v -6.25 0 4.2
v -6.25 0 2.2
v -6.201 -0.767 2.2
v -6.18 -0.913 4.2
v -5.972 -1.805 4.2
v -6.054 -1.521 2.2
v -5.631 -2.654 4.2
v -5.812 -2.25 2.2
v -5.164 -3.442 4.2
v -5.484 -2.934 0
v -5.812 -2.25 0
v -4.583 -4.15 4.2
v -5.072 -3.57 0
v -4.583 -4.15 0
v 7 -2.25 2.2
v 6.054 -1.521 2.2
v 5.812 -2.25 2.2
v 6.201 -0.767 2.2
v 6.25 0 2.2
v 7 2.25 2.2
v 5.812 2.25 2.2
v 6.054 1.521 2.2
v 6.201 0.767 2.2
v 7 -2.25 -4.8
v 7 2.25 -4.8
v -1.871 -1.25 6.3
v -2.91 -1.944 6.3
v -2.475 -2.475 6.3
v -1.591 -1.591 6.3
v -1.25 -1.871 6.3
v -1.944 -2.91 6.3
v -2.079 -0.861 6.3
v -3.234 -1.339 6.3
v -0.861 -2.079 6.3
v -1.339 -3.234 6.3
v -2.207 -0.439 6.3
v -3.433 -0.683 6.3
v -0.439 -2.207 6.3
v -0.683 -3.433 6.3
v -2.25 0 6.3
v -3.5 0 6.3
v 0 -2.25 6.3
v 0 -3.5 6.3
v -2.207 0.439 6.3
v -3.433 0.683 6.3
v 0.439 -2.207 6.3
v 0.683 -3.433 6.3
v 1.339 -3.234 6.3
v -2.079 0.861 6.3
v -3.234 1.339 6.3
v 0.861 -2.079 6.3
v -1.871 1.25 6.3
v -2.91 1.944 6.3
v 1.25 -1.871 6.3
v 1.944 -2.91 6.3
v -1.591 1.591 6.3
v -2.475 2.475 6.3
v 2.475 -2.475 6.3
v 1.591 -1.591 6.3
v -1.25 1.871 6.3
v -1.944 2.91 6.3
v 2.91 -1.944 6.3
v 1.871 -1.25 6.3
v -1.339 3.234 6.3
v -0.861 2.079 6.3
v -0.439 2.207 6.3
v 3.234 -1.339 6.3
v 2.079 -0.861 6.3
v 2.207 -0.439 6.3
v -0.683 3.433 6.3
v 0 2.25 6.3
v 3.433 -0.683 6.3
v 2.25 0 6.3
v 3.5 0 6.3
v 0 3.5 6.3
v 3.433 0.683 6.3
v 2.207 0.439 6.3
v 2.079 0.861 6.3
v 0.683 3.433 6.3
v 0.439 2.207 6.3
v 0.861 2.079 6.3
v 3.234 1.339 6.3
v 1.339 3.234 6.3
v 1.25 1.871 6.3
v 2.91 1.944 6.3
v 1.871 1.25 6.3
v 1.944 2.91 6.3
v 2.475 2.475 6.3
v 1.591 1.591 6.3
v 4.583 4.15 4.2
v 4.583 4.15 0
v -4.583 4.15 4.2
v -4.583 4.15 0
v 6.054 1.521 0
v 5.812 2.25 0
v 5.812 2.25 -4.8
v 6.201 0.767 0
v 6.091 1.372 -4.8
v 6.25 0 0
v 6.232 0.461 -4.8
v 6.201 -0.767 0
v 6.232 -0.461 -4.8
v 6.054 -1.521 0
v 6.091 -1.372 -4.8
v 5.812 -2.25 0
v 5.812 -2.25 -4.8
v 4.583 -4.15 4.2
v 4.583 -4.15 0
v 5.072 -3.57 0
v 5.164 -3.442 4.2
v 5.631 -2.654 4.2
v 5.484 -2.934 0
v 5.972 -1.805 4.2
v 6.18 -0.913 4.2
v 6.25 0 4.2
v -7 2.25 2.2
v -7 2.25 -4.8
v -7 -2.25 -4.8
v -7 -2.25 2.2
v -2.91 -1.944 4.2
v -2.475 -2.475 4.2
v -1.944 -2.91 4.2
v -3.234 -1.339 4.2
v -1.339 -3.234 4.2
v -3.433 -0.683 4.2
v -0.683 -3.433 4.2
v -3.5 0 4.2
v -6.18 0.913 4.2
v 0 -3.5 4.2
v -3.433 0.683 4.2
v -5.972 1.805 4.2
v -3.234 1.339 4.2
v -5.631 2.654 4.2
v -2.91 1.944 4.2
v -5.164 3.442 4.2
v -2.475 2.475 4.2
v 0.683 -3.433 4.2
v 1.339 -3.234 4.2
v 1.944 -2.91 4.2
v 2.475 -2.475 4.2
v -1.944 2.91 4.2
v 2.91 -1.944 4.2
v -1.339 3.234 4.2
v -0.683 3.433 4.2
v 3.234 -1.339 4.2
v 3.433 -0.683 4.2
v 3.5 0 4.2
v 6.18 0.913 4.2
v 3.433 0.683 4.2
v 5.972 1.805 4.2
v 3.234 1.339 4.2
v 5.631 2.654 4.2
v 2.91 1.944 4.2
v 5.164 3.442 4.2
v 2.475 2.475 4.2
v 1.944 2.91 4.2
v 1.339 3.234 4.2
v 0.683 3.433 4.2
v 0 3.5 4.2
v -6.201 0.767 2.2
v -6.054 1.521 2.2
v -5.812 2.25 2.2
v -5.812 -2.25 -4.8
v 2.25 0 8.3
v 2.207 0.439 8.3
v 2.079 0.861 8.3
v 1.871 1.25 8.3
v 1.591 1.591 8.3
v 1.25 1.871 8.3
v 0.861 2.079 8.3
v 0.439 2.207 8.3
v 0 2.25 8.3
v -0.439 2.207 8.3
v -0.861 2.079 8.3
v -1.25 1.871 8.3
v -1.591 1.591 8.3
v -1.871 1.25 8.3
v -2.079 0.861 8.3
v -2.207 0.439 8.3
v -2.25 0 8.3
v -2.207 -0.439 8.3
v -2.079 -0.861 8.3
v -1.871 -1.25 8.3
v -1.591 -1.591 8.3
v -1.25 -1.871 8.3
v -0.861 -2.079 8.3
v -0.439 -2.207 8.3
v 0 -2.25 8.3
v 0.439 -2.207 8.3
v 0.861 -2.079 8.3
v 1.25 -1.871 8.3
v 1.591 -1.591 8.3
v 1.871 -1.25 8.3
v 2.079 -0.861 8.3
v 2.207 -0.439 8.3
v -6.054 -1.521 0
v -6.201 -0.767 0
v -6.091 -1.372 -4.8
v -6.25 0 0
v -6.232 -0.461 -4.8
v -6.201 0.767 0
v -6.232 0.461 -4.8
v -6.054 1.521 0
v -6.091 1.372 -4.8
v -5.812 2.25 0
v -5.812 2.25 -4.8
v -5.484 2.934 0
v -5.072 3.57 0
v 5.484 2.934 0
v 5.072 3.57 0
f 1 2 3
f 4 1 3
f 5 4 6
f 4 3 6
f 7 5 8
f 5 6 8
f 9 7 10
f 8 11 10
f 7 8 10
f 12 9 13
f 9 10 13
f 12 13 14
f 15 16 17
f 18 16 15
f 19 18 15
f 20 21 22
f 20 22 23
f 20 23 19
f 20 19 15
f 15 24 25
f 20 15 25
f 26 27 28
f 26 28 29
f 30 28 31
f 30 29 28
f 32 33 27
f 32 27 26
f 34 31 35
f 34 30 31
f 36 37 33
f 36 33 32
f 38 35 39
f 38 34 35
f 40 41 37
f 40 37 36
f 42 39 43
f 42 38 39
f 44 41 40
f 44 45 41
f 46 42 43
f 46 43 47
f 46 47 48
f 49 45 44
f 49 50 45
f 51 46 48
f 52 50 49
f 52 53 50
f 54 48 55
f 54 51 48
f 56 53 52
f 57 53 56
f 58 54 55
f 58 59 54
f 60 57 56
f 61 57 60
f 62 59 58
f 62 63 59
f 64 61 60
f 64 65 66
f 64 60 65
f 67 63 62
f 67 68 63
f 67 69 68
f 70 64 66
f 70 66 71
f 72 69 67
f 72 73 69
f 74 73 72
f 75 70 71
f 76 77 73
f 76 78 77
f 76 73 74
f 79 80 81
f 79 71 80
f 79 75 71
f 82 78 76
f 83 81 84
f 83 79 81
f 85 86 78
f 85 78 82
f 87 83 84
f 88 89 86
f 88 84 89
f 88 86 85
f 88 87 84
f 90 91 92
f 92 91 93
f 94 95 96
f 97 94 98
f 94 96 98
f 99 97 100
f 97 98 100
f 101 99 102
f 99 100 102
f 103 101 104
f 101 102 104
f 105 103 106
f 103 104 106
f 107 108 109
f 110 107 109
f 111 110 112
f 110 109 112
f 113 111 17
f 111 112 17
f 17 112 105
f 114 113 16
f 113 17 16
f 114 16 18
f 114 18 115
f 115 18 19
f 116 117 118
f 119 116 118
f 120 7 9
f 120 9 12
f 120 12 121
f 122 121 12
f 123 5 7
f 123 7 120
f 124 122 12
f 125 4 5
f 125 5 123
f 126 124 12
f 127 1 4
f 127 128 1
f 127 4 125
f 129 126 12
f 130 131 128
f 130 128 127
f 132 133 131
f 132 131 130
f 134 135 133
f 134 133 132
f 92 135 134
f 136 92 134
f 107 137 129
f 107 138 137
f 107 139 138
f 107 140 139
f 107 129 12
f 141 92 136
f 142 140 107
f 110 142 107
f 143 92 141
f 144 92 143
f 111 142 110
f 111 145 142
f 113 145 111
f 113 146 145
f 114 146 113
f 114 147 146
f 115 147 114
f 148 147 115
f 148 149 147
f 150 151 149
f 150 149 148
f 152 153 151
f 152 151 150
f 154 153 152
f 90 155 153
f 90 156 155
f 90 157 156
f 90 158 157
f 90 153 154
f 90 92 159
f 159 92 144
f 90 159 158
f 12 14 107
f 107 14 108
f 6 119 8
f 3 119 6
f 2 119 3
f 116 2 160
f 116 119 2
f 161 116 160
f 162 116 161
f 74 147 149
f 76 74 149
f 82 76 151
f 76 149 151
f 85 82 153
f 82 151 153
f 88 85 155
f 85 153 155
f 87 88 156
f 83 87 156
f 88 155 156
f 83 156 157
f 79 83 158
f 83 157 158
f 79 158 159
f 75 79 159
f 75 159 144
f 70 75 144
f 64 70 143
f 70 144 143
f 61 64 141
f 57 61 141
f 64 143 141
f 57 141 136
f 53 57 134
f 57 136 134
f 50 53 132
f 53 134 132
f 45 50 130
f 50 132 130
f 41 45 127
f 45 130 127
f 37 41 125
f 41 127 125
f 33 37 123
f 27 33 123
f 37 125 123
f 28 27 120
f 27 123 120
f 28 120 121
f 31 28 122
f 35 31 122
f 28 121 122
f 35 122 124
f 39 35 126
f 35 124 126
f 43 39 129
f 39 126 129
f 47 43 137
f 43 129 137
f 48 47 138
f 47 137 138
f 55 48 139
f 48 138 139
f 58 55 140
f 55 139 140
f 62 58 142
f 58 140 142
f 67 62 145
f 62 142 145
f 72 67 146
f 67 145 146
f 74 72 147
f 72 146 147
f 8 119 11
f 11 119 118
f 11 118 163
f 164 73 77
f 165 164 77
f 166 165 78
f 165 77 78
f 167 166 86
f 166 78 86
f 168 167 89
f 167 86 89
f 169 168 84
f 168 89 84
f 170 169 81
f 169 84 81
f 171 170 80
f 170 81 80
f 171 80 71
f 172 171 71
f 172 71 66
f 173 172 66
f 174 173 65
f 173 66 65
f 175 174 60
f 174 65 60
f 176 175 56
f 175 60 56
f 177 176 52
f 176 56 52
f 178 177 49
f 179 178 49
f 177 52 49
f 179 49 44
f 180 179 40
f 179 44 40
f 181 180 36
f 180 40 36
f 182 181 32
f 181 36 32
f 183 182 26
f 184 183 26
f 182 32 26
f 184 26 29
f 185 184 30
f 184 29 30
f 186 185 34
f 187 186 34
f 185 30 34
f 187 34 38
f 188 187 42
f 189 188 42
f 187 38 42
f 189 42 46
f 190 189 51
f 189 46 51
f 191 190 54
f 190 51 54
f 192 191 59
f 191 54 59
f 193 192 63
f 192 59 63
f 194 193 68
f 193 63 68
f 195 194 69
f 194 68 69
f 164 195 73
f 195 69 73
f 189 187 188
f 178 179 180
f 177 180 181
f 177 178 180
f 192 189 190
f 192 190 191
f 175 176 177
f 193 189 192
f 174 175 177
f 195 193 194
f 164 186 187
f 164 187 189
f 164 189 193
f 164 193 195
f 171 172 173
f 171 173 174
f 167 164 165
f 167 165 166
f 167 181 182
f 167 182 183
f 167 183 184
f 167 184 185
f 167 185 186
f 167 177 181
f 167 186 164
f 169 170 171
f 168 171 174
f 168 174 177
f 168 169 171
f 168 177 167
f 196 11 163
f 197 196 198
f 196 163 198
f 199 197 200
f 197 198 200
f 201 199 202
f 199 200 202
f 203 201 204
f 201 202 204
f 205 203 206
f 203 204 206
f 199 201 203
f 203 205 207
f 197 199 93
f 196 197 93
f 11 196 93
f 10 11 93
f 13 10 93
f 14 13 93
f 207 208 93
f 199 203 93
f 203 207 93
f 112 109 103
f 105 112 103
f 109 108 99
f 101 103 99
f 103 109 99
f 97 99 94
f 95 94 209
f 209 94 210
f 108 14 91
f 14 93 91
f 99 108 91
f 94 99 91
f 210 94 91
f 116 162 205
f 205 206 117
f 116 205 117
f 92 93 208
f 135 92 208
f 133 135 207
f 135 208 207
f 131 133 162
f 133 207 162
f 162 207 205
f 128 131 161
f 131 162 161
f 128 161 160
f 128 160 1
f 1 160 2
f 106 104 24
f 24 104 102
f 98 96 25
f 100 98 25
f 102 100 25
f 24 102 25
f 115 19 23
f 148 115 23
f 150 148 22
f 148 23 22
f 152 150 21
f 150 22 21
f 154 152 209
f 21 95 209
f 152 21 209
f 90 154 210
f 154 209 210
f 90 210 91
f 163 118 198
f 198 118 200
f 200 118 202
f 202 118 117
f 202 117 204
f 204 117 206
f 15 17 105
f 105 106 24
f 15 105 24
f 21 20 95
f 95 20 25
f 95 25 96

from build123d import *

# Parameters (mm, degrees)
EXTRUDE_1_DEPTH = 4.2
SKETCH_2_R      = 3.5
EXTRUDE_2_DEPTH = 2.1
SKETCH_3_R      = 2.25
EXTRUDE_3_DEPTH = 2
EXTRUDE_START   = -9
EXTRUDE_4_DEPTH = 7


with BuildPart() as part:
    # 草图1 → 凸台-拉伸1 (new body)
    with BuildSketch(Plane.XY):
        with BuildLine():
            ThreePointArc((-6.25, 3.3e-08), (-5.817755734, -2.236089463), (-4.583301282, -4.15))
            Line((-4.583301282, -4.15), (4.583301282, -4.15))
            ThreePointArc((4.583301282, -4.15), (5.817755724, -2.236089488), (6.25, -2.1e-08))
            ThreePointArc((6.25, -2.1e-08), (5.817755732, 2.236089469), (4.583301282, 4.15))
            Line((4.583301282, 4.15), (-4.583301282, 4.15))
            ThreePointArc((-4.583301282, 4.15), (-5.817755722, 2.236089494), (-6.25, 3.3e-08))
        make_face()
    extrude(amount=EXTRUDE_1_DEPTH)

    # 草图2 → 凸台-拉伸2 (add)
    with BuildSketch(Plane.XY.offset(4.2)):
        Circle(SKETCH_2_R)
    extrude(amount=EXTRUDE_2_DEPTH)

    # 草图3 → 凸台-拉伸3 (add)
    with BuildSketch(Plane.XY.offset(6.3)):
        Circle(SKETCH_3_R)
    extrude(amount=EXTRUDE_3_DEPTH)

    # 草图4 → 凸台-拉伸4 (add)
    with BuildSketch(Plane.XY.offset(4.2).offset(EXTRUDE_START)):
        with BuildLine():
            ThreePointArc((-5.812148865, -2.25), (-6.25, 0), (-5.812148865, 2.25))
            Line((-5.812148865, 2.25), (-7, 2.25))
            Line((-7, 2.25), (-7, -2.25))
            Line((-7, -2.25), (-5.812148865, -2.25))
        make_face()
        with BuildLine():
            Line((7, 2.25), (5.812148865, 2.25))
            ThreePointArc((5.812148865, 2.25), (6.25, 0), (5.812148865, -2.25))
            Line((5.812148865, -2.25), (7, -2.25))
            Line((7, -2.25), (7, 2.25))
        make_face()
    extrude(amount=EXTRUDE_4_DEPTH)


solid = part.part
